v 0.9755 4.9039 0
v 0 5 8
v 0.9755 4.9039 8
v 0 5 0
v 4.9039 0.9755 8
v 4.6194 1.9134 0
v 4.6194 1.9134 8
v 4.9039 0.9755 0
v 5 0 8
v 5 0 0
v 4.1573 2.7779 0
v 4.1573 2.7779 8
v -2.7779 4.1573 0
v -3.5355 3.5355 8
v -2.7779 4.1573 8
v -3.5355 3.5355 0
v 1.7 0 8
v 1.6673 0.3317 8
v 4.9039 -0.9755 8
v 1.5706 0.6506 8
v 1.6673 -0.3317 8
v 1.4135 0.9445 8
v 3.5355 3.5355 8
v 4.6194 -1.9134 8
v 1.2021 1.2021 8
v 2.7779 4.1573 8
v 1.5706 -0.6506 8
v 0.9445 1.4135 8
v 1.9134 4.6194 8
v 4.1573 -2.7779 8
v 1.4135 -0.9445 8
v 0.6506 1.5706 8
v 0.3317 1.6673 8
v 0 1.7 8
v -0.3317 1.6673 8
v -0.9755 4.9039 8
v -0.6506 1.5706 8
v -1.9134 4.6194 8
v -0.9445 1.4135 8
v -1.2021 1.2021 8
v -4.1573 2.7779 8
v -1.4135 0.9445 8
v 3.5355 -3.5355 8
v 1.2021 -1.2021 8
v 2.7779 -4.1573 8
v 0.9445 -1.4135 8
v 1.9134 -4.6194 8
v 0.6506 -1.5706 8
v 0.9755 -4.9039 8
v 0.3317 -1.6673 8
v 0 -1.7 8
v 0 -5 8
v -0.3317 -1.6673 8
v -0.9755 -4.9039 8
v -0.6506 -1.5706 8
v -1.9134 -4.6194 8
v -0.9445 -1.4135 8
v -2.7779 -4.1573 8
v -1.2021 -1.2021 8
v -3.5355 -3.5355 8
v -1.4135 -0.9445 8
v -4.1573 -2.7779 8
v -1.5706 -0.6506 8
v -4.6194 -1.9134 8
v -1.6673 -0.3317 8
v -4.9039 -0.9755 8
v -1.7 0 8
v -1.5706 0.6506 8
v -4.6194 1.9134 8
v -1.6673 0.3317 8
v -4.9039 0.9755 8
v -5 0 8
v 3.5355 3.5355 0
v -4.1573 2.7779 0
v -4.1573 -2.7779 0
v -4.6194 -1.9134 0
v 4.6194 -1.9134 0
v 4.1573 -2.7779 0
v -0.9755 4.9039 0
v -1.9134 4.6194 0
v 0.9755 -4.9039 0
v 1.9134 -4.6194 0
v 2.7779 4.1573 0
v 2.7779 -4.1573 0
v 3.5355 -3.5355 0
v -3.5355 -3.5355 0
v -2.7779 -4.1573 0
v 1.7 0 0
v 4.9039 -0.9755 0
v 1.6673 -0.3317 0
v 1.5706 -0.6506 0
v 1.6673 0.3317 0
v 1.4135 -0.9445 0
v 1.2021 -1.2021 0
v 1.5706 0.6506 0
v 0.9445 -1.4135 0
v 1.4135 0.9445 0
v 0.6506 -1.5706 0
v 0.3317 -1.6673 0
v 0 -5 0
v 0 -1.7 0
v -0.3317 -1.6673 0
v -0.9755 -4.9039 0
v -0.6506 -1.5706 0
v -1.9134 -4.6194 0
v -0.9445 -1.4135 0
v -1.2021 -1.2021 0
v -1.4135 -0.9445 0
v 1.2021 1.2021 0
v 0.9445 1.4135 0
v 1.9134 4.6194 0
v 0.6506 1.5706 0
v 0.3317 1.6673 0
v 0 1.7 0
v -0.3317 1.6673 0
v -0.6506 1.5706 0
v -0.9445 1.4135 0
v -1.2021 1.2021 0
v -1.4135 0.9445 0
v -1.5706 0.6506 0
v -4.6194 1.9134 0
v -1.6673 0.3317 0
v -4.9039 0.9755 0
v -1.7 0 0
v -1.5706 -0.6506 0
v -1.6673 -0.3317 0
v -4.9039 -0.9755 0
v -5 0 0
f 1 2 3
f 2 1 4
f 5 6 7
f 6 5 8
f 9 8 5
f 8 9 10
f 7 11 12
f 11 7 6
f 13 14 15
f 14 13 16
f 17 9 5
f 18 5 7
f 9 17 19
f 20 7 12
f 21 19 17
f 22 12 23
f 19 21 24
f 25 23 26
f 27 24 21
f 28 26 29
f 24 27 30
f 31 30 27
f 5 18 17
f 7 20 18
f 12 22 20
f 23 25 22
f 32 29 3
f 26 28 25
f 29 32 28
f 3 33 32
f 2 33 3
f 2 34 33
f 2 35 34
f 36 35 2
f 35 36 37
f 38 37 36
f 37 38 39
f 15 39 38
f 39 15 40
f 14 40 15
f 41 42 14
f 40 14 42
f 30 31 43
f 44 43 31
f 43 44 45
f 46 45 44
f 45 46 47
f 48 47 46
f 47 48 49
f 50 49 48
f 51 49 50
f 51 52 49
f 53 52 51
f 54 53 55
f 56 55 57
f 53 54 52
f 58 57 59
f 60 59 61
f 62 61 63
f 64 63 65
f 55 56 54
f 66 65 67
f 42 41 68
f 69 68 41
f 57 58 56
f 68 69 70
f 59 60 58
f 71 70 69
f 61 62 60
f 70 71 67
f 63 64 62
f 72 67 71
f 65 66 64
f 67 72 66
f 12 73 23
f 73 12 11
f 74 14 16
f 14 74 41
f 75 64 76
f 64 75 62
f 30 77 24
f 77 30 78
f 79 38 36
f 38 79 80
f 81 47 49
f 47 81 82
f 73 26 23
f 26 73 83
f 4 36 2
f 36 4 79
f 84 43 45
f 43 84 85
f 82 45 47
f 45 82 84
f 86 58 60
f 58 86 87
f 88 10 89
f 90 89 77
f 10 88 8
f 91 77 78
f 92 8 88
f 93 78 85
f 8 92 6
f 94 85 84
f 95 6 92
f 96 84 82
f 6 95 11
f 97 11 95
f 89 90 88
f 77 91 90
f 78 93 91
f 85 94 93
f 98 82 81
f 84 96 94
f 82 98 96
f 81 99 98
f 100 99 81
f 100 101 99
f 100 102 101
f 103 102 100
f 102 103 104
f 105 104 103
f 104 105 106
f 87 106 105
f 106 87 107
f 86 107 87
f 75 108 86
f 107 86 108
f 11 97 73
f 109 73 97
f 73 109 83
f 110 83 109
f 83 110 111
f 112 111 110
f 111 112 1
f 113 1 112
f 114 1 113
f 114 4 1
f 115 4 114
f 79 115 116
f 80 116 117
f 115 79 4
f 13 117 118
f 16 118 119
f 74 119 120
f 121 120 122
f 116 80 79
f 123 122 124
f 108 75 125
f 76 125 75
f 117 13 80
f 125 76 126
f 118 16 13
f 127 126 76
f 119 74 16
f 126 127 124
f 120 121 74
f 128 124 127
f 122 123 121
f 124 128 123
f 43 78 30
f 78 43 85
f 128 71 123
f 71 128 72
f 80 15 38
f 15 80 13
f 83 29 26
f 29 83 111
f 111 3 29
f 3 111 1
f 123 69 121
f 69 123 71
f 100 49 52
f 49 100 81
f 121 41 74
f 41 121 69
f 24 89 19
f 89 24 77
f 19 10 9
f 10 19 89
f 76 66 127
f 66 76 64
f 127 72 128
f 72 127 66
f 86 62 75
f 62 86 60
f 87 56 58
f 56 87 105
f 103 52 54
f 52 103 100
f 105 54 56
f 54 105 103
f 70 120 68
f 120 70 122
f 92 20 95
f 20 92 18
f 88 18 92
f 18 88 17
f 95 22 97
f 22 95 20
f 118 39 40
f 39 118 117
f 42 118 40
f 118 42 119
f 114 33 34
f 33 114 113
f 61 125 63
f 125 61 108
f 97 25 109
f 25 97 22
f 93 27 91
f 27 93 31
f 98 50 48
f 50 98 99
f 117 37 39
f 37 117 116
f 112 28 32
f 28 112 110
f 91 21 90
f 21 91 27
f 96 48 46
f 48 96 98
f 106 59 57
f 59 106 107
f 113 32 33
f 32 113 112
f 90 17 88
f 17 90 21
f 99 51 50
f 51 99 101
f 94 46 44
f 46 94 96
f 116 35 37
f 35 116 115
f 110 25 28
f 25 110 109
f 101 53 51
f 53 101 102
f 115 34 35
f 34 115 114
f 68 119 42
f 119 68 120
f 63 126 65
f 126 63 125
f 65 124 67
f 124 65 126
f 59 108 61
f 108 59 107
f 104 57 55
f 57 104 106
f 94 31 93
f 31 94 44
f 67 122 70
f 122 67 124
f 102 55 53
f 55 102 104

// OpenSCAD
// ModuDeck donor chassis study: NOT a verified ThinkPad fit.
// Millimetres. 370x240 is an unconfirmed owner measurement.
$fn=32; W=370; D=240; t=3;
module plate(w,d,h){cube([w,d,h]);}
module shell(w,d,h){difference(){cube([w,d,h]);translate([t,t,t])cube([w-2*t,d-2*t,h]);}}
module hole(x,y,h){translate([x,y,-1])cylinder(d=3.4,h=h+2);}
module rail(n){difference(){cube([n,12,6]);for(x=[10:20:n-10])hole(x,6,6);}}
module rear(){difference(){cube([W-6,3,25]);translate([W/2-23,-1,6])cube([40,5,14]);for(x=[10,W-16])translate([x,-1,12])rotate([-90,0,0])cylinder(d=3.4,h=5);}}
module tray(){difference(){shell(W,D,30);translate([3,D-4,3])cube([W-6,6,27]);for(x=[15,W-15],y=[15,D-15])hole(x,y,30);}}
difference(){cylinder(d=10,h=8);translate([0,0,-1])cylinder(d=3.4,h=10);}
